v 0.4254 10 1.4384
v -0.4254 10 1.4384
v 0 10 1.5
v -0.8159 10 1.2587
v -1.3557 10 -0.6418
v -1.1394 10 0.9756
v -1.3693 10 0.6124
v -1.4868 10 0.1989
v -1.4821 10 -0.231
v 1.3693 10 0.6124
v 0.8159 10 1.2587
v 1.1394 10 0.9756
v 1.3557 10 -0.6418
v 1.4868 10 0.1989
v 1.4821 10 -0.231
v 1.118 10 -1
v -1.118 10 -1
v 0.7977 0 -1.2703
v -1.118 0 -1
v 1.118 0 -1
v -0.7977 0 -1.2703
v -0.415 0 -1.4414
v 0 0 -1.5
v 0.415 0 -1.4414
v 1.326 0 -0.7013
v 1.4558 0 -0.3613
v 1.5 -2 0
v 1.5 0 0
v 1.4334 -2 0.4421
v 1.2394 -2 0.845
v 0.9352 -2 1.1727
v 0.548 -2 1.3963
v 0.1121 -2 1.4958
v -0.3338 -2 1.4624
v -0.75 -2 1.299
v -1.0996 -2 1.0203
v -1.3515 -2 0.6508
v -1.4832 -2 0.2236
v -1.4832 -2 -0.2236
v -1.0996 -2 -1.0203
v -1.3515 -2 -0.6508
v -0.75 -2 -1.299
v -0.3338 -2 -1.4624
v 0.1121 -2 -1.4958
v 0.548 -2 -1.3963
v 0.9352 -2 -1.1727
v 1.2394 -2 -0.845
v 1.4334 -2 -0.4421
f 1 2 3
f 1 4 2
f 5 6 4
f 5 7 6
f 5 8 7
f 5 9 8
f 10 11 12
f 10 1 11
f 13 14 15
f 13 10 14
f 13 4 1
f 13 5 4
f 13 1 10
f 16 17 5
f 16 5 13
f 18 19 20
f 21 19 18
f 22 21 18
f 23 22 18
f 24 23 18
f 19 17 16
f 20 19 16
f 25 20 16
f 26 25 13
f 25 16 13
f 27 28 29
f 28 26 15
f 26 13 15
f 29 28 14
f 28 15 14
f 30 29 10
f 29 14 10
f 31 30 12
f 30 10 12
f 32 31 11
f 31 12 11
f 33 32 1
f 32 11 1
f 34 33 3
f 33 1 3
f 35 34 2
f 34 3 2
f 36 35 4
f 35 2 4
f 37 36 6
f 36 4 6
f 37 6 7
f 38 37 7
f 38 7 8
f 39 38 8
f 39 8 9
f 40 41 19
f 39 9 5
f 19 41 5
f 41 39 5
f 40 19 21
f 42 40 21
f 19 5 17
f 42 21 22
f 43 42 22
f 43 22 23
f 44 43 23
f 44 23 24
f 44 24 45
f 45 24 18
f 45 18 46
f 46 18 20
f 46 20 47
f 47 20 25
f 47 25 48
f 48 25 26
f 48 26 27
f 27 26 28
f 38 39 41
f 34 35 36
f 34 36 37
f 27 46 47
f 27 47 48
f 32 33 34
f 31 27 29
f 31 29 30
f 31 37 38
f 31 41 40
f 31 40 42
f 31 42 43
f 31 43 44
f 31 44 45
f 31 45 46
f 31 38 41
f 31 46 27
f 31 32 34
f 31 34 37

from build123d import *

# Parameters (mm, degrees)
SKETCH_1_R          = 1.5
EXTRUDE_1_DEPTH     = 10
CUT_EXTRUDE_START   = -10
CUT_EXTRUDE_1_DEPTH = 10
BOSS_EXTRUDE1_START = 2
SKETCH1_R           = 1.5
BOSS_EXTRUDE1_DEPTH = 2


with BuildPart() as part:
    # 草图1 → 凸台-拉伸1 (new body)
    with BuildSketch(Plane(origin=(0, 0, 0), x_dir=(1, 0, 0), z_dir=(0, 1, 0))):
        Circle(SKETCH_1_R)
    extrude(amount=EXTRUDE_1_DEPTH)

    # 草图2 → 切除-拉伸1 (cut)
    with BuildSketch(Plane(origin=(0, 10, 0), x_dir=(1, 0, 0), z_dir=(0, 1, 0)).offset(CUT_EXTRUDE_START)):
        with BuildLine():
            Line((-1.118033989, 1), (1.118033989, 1))
            ThreePointArc((1.118033989, 1), (0, 1.5), (-1.118033989, 1))
        make_face()
    extrude(amount=CUT_EXTRUDE_1_DEPTH, mode=Mode.SUBTRACT)

    # Sketch1 → Boss-Extrude1 (add)
    with BuildSketch(Plane.XZ.offset(BOSS_EXTRUDE1_START)):
        Circle(SKETCH1_R)
    extrude(amount=-BOSS_EXTRUDE1_DEPTH)


solid = part.part
